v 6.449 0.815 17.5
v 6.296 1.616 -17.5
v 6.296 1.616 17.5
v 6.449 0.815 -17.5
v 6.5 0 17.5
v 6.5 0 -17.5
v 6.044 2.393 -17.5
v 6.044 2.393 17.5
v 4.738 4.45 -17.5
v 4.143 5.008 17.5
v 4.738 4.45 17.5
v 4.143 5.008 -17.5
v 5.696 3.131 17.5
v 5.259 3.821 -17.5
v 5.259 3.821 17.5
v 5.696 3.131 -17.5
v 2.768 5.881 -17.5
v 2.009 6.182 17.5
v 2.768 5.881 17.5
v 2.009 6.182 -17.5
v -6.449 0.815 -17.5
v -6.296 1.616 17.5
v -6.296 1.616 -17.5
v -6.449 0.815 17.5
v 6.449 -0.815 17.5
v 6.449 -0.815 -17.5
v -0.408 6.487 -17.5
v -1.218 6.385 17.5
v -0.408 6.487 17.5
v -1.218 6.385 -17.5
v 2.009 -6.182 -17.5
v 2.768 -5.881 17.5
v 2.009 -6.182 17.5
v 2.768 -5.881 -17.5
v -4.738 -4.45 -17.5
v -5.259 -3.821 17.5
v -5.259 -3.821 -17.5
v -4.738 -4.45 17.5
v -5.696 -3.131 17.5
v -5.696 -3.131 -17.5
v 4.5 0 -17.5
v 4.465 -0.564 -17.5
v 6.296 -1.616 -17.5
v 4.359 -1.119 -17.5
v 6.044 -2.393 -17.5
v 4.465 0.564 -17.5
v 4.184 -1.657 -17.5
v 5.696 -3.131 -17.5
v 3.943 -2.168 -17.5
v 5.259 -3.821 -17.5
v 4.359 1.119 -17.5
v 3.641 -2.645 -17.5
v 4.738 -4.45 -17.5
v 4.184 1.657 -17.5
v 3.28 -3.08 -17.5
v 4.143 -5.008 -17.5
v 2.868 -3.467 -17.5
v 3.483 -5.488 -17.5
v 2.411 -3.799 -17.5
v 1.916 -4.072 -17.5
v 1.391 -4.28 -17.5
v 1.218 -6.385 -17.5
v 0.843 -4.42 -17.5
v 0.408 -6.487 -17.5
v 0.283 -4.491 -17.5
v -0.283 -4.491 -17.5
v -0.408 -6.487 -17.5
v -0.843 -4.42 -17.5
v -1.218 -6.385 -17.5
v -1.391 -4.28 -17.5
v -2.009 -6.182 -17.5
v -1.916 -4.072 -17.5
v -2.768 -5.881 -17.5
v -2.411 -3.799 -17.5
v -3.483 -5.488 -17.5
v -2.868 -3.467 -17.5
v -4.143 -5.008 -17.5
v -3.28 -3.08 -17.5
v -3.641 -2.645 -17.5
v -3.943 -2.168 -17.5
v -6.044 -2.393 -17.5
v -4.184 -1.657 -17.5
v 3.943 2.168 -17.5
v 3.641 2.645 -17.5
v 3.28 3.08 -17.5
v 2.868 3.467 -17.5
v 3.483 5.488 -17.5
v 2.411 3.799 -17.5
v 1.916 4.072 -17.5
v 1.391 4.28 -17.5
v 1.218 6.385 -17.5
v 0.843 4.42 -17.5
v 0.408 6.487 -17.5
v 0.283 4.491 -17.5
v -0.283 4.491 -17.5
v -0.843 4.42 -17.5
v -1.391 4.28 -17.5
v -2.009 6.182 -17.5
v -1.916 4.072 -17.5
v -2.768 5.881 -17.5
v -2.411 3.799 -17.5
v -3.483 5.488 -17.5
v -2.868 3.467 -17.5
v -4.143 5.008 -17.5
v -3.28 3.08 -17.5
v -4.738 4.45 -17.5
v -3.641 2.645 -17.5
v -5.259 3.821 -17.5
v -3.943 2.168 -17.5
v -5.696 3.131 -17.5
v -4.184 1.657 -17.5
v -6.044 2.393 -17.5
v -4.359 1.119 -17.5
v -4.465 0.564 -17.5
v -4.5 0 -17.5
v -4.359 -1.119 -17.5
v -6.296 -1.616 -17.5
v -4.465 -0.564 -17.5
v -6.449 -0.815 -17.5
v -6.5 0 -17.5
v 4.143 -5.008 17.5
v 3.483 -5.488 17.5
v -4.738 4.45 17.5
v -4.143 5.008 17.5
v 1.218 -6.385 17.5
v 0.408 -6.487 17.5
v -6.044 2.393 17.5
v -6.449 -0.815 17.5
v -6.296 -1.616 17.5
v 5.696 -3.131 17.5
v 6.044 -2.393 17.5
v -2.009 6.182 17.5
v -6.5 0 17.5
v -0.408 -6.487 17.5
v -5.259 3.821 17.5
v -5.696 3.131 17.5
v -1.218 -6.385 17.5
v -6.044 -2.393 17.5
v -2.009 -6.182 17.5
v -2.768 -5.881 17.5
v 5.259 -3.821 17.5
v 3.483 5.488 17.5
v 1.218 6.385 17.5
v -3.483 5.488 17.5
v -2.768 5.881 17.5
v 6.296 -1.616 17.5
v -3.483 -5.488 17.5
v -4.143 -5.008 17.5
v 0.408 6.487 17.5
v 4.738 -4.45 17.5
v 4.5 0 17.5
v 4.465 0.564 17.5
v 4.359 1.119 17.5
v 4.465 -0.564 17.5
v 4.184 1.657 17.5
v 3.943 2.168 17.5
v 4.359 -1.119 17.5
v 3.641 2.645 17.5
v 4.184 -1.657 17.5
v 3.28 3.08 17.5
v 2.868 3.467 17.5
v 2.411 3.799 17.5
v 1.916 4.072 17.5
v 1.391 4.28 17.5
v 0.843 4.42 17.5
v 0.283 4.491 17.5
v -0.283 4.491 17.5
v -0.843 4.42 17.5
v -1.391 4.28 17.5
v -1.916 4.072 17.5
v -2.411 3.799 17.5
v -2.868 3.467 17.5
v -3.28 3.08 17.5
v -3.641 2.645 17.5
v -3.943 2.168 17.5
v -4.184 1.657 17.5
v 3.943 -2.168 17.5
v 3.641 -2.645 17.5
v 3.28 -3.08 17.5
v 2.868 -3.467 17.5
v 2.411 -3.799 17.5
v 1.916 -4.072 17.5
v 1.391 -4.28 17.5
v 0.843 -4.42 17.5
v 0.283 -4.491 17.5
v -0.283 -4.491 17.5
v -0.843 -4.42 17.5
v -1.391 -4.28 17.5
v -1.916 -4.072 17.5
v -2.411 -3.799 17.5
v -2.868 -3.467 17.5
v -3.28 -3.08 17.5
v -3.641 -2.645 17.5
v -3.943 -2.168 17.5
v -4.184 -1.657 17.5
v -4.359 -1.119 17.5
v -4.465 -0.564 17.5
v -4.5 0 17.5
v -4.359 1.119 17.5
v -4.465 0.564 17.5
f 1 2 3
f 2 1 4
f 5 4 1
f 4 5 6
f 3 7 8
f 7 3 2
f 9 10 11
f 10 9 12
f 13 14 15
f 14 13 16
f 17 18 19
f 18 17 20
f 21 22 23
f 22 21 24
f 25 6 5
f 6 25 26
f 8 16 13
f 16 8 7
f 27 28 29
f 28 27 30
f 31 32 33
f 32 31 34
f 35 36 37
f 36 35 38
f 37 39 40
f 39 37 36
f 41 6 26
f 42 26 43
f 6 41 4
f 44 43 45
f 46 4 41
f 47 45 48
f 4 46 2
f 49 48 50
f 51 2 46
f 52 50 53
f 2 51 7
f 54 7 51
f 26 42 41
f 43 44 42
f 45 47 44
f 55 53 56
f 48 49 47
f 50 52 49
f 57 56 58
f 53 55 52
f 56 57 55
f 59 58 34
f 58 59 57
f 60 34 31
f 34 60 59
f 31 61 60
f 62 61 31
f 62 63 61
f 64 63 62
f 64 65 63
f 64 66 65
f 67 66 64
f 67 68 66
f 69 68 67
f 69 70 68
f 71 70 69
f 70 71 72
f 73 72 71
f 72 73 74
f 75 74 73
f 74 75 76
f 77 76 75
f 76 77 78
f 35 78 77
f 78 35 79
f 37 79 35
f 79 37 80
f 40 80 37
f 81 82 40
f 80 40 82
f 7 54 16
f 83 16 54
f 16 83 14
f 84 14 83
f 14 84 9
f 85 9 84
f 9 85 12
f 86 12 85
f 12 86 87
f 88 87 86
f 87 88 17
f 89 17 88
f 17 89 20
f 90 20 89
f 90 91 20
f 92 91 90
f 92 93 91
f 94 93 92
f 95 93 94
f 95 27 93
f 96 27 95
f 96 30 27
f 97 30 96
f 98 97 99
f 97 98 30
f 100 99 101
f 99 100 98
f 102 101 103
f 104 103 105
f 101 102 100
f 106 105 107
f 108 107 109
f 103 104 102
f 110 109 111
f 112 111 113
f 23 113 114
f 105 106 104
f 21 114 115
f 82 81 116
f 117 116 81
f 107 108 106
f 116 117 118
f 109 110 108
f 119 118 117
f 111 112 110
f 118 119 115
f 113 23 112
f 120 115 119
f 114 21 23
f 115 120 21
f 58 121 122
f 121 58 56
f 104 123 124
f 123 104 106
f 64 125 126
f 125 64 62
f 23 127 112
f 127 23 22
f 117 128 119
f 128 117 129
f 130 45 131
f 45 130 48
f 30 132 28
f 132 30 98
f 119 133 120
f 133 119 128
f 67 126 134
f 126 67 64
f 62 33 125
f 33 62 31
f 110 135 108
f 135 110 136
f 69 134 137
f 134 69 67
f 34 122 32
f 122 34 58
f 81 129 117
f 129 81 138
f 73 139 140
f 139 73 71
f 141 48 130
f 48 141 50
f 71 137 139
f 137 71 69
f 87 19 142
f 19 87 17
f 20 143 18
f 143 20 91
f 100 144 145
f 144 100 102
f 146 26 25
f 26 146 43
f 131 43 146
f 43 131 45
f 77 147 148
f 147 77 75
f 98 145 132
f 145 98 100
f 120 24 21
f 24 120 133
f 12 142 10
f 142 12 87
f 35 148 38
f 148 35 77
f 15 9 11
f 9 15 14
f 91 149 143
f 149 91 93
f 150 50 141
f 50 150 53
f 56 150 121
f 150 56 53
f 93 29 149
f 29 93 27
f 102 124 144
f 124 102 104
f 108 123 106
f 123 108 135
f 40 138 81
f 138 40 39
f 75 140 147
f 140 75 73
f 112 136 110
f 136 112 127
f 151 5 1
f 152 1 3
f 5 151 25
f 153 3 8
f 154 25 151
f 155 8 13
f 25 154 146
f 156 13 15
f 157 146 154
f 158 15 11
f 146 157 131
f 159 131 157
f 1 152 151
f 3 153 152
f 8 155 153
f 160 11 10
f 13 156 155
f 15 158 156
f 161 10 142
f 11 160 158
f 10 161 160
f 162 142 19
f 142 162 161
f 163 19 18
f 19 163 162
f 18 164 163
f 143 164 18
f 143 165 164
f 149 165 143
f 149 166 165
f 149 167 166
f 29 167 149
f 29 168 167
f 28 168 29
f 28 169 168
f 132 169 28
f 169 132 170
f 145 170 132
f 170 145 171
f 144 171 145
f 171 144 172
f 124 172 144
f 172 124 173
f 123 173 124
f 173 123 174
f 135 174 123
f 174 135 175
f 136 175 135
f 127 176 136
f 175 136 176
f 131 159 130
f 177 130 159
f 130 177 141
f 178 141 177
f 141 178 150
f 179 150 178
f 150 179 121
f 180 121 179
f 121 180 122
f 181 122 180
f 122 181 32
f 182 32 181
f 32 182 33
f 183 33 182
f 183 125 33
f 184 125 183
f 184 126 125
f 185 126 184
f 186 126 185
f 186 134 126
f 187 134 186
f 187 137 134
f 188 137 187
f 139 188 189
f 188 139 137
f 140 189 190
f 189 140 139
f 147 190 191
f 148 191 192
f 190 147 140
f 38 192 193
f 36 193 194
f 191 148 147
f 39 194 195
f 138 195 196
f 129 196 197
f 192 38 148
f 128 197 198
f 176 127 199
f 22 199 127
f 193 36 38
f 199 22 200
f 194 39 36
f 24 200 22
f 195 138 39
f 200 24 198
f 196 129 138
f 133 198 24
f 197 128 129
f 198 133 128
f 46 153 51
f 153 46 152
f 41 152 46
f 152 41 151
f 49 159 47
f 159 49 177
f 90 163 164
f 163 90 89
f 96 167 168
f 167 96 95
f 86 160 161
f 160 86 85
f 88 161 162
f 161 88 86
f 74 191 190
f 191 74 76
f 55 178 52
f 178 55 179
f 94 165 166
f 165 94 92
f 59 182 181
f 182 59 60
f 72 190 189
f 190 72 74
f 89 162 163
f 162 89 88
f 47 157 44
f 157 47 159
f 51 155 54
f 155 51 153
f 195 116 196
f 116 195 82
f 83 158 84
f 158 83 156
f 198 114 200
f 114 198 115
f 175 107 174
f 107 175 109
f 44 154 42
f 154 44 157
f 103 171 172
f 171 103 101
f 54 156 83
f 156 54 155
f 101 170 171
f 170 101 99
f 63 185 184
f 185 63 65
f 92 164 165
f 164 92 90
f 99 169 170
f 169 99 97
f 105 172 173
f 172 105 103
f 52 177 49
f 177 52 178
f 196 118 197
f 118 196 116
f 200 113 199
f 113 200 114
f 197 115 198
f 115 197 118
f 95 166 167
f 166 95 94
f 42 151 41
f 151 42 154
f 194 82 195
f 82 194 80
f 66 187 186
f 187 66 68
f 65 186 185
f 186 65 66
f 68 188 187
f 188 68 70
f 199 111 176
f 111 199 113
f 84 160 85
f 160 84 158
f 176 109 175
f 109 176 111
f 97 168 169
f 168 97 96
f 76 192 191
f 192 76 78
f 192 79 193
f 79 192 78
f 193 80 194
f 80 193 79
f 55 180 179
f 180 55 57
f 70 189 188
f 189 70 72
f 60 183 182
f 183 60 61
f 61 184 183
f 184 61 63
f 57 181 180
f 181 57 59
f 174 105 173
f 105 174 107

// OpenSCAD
$fn = 50;


difference() {
	union() {
		translate(v = [0, 0, -17.5000000000]) {
			cylinder(h = 35, r = 6.5000000000);
		}
	}
	union() {
		translate(v = [0, 0, -100.0000000000]) {
			cylinder(h = 200, r = 4.5000000000);
		}
	}
}
